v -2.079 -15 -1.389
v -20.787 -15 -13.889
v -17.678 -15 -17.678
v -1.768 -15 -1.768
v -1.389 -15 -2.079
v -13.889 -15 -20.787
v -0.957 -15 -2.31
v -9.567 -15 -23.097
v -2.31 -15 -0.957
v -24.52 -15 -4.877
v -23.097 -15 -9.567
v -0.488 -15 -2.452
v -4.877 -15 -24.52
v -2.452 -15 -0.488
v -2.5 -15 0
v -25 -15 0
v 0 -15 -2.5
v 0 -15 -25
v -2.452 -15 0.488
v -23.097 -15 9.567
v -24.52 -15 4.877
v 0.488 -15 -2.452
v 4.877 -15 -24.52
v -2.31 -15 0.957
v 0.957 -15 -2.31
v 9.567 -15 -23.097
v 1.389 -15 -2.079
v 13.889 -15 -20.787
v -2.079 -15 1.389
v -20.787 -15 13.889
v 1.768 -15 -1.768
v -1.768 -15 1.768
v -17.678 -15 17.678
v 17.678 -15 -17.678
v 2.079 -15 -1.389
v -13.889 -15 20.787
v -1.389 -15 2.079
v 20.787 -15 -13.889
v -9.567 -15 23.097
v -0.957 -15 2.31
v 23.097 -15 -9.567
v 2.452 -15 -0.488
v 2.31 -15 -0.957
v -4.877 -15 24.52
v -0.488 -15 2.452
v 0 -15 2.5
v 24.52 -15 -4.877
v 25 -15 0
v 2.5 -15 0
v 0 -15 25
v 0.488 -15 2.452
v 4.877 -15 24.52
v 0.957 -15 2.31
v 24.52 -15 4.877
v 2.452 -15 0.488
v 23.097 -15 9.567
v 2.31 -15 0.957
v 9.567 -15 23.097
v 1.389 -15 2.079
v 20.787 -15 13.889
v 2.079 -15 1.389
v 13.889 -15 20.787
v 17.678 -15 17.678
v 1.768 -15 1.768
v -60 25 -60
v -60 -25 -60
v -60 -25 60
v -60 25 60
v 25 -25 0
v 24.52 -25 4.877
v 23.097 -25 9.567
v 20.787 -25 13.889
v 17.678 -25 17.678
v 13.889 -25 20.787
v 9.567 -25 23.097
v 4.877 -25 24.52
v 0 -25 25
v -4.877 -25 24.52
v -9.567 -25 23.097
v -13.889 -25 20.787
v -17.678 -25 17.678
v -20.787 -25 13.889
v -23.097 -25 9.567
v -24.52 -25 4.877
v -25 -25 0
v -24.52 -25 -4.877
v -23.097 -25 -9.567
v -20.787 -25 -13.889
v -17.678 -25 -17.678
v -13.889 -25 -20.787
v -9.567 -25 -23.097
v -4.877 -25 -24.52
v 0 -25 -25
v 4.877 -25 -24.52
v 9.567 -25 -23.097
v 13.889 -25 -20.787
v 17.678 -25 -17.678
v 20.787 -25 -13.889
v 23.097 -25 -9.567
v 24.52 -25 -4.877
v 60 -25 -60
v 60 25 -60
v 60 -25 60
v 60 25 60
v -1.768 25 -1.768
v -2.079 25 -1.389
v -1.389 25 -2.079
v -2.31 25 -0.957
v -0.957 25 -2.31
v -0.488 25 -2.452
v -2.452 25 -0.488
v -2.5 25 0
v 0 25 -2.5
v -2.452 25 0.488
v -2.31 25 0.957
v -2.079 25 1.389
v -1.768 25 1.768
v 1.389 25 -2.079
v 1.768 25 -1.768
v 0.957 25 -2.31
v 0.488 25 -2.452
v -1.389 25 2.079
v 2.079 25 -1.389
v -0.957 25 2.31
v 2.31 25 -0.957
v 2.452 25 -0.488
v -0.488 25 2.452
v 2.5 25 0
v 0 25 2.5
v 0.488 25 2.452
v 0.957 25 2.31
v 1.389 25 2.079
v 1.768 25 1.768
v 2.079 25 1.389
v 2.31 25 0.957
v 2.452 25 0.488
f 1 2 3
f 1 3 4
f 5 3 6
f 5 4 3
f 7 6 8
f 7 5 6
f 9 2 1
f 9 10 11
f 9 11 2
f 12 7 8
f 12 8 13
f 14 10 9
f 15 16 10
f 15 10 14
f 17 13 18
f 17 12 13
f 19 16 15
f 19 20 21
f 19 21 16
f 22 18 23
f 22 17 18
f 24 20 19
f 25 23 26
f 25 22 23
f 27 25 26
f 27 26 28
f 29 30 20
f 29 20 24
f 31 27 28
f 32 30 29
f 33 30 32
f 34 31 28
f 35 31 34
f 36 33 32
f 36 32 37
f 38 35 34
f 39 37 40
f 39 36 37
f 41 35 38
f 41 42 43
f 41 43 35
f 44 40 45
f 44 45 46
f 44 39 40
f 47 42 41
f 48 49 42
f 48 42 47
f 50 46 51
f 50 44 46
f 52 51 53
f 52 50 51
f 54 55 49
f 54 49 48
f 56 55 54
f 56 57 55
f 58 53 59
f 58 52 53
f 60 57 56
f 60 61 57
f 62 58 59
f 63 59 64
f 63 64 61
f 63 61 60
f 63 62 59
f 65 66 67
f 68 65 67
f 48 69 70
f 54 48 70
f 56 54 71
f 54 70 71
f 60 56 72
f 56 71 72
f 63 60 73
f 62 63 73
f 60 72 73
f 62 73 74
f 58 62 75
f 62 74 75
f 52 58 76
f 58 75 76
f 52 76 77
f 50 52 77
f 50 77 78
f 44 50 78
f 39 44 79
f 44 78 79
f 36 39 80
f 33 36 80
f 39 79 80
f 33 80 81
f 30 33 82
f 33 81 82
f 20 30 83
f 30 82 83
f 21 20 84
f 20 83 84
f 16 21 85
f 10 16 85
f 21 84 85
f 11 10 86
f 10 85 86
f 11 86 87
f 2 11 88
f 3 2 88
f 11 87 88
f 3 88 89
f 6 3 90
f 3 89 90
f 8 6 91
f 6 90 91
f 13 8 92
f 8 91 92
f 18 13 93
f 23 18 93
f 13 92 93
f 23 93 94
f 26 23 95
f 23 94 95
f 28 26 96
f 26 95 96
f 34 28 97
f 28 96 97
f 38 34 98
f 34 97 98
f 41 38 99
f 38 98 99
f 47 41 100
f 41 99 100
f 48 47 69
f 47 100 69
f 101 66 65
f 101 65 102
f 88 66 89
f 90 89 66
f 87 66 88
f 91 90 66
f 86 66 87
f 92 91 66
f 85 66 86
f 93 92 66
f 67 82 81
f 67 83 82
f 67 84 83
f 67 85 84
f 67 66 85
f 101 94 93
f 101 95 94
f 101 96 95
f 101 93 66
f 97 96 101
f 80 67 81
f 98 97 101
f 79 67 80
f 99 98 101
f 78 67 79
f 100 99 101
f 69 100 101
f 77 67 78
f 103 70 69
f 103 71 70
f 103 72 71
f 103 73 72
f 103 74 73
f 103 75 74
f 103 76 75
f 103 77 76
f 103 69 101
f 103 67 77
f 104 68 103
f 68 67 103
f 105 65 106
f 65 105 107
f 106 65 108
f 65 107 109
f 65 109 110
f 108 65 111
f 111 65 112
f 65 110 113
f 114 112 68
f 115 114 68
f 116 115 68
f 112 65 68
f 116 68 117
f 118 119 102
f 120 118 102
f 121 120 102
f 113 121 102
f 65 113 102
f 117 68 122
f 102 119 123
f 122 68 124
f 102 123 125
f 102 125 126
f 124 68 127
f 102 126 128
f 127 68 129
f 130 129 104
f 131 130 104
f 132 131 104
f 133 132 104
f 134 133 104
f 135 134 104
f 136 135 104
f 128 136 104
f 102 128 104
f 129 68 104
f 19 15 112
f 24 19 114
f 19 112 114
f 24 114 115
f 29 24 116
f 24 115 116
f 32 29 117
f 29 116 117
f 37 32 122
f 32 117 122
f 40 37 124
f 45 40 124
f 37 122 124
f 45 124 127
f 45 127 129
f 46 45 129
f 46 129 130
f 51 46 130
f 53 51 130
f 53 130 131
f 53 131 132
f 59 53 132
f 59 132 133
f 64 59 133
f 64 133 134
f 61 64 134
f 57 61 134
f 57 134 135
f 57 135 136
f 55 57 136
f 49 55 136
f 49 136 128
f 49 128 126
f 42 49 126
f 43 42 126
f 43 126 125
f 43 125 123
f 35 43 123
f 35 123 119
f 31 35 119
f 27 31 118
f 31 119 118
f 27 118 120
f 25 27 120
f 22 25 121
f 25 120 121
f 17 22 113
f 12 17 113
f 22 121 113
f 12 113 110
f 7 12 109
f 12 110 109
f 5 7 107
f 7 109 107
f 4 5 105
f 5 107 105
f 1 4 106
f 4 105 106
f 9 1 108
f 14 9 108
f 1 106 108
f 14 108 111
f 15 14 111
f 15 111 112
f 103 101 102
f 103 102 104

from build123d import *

# Parameters (mm, degrees)
F0_W     = 120
F0_H     = 120
F1_DEPTH = 25
F2_R     = 25
F3_DEPTH = 10
F5_D     = 5


with BuildPart() as f1:
    # F0 (on Front) → F1 (new body, symmetric)
    with BuildSketch(Plane.XZ):
        Rectangle(F0_W, F0_H)
    extrude(amount=F1_DEPTH, both=True)

    # F2 (on face) → F3 (cut)
    with BuildSketch(Plane.XZ.offset(25)):
        Circle(F2_R)
    extrude(amount=-F3_DEPTH, mode=Mode.SUBTRACT)

    # F5 (through all)
    with Locations(Plane.XZ.offset(15)):
        with Locations((0, 0)):
            Hole(F5_D / 2)


solid = f1.part
